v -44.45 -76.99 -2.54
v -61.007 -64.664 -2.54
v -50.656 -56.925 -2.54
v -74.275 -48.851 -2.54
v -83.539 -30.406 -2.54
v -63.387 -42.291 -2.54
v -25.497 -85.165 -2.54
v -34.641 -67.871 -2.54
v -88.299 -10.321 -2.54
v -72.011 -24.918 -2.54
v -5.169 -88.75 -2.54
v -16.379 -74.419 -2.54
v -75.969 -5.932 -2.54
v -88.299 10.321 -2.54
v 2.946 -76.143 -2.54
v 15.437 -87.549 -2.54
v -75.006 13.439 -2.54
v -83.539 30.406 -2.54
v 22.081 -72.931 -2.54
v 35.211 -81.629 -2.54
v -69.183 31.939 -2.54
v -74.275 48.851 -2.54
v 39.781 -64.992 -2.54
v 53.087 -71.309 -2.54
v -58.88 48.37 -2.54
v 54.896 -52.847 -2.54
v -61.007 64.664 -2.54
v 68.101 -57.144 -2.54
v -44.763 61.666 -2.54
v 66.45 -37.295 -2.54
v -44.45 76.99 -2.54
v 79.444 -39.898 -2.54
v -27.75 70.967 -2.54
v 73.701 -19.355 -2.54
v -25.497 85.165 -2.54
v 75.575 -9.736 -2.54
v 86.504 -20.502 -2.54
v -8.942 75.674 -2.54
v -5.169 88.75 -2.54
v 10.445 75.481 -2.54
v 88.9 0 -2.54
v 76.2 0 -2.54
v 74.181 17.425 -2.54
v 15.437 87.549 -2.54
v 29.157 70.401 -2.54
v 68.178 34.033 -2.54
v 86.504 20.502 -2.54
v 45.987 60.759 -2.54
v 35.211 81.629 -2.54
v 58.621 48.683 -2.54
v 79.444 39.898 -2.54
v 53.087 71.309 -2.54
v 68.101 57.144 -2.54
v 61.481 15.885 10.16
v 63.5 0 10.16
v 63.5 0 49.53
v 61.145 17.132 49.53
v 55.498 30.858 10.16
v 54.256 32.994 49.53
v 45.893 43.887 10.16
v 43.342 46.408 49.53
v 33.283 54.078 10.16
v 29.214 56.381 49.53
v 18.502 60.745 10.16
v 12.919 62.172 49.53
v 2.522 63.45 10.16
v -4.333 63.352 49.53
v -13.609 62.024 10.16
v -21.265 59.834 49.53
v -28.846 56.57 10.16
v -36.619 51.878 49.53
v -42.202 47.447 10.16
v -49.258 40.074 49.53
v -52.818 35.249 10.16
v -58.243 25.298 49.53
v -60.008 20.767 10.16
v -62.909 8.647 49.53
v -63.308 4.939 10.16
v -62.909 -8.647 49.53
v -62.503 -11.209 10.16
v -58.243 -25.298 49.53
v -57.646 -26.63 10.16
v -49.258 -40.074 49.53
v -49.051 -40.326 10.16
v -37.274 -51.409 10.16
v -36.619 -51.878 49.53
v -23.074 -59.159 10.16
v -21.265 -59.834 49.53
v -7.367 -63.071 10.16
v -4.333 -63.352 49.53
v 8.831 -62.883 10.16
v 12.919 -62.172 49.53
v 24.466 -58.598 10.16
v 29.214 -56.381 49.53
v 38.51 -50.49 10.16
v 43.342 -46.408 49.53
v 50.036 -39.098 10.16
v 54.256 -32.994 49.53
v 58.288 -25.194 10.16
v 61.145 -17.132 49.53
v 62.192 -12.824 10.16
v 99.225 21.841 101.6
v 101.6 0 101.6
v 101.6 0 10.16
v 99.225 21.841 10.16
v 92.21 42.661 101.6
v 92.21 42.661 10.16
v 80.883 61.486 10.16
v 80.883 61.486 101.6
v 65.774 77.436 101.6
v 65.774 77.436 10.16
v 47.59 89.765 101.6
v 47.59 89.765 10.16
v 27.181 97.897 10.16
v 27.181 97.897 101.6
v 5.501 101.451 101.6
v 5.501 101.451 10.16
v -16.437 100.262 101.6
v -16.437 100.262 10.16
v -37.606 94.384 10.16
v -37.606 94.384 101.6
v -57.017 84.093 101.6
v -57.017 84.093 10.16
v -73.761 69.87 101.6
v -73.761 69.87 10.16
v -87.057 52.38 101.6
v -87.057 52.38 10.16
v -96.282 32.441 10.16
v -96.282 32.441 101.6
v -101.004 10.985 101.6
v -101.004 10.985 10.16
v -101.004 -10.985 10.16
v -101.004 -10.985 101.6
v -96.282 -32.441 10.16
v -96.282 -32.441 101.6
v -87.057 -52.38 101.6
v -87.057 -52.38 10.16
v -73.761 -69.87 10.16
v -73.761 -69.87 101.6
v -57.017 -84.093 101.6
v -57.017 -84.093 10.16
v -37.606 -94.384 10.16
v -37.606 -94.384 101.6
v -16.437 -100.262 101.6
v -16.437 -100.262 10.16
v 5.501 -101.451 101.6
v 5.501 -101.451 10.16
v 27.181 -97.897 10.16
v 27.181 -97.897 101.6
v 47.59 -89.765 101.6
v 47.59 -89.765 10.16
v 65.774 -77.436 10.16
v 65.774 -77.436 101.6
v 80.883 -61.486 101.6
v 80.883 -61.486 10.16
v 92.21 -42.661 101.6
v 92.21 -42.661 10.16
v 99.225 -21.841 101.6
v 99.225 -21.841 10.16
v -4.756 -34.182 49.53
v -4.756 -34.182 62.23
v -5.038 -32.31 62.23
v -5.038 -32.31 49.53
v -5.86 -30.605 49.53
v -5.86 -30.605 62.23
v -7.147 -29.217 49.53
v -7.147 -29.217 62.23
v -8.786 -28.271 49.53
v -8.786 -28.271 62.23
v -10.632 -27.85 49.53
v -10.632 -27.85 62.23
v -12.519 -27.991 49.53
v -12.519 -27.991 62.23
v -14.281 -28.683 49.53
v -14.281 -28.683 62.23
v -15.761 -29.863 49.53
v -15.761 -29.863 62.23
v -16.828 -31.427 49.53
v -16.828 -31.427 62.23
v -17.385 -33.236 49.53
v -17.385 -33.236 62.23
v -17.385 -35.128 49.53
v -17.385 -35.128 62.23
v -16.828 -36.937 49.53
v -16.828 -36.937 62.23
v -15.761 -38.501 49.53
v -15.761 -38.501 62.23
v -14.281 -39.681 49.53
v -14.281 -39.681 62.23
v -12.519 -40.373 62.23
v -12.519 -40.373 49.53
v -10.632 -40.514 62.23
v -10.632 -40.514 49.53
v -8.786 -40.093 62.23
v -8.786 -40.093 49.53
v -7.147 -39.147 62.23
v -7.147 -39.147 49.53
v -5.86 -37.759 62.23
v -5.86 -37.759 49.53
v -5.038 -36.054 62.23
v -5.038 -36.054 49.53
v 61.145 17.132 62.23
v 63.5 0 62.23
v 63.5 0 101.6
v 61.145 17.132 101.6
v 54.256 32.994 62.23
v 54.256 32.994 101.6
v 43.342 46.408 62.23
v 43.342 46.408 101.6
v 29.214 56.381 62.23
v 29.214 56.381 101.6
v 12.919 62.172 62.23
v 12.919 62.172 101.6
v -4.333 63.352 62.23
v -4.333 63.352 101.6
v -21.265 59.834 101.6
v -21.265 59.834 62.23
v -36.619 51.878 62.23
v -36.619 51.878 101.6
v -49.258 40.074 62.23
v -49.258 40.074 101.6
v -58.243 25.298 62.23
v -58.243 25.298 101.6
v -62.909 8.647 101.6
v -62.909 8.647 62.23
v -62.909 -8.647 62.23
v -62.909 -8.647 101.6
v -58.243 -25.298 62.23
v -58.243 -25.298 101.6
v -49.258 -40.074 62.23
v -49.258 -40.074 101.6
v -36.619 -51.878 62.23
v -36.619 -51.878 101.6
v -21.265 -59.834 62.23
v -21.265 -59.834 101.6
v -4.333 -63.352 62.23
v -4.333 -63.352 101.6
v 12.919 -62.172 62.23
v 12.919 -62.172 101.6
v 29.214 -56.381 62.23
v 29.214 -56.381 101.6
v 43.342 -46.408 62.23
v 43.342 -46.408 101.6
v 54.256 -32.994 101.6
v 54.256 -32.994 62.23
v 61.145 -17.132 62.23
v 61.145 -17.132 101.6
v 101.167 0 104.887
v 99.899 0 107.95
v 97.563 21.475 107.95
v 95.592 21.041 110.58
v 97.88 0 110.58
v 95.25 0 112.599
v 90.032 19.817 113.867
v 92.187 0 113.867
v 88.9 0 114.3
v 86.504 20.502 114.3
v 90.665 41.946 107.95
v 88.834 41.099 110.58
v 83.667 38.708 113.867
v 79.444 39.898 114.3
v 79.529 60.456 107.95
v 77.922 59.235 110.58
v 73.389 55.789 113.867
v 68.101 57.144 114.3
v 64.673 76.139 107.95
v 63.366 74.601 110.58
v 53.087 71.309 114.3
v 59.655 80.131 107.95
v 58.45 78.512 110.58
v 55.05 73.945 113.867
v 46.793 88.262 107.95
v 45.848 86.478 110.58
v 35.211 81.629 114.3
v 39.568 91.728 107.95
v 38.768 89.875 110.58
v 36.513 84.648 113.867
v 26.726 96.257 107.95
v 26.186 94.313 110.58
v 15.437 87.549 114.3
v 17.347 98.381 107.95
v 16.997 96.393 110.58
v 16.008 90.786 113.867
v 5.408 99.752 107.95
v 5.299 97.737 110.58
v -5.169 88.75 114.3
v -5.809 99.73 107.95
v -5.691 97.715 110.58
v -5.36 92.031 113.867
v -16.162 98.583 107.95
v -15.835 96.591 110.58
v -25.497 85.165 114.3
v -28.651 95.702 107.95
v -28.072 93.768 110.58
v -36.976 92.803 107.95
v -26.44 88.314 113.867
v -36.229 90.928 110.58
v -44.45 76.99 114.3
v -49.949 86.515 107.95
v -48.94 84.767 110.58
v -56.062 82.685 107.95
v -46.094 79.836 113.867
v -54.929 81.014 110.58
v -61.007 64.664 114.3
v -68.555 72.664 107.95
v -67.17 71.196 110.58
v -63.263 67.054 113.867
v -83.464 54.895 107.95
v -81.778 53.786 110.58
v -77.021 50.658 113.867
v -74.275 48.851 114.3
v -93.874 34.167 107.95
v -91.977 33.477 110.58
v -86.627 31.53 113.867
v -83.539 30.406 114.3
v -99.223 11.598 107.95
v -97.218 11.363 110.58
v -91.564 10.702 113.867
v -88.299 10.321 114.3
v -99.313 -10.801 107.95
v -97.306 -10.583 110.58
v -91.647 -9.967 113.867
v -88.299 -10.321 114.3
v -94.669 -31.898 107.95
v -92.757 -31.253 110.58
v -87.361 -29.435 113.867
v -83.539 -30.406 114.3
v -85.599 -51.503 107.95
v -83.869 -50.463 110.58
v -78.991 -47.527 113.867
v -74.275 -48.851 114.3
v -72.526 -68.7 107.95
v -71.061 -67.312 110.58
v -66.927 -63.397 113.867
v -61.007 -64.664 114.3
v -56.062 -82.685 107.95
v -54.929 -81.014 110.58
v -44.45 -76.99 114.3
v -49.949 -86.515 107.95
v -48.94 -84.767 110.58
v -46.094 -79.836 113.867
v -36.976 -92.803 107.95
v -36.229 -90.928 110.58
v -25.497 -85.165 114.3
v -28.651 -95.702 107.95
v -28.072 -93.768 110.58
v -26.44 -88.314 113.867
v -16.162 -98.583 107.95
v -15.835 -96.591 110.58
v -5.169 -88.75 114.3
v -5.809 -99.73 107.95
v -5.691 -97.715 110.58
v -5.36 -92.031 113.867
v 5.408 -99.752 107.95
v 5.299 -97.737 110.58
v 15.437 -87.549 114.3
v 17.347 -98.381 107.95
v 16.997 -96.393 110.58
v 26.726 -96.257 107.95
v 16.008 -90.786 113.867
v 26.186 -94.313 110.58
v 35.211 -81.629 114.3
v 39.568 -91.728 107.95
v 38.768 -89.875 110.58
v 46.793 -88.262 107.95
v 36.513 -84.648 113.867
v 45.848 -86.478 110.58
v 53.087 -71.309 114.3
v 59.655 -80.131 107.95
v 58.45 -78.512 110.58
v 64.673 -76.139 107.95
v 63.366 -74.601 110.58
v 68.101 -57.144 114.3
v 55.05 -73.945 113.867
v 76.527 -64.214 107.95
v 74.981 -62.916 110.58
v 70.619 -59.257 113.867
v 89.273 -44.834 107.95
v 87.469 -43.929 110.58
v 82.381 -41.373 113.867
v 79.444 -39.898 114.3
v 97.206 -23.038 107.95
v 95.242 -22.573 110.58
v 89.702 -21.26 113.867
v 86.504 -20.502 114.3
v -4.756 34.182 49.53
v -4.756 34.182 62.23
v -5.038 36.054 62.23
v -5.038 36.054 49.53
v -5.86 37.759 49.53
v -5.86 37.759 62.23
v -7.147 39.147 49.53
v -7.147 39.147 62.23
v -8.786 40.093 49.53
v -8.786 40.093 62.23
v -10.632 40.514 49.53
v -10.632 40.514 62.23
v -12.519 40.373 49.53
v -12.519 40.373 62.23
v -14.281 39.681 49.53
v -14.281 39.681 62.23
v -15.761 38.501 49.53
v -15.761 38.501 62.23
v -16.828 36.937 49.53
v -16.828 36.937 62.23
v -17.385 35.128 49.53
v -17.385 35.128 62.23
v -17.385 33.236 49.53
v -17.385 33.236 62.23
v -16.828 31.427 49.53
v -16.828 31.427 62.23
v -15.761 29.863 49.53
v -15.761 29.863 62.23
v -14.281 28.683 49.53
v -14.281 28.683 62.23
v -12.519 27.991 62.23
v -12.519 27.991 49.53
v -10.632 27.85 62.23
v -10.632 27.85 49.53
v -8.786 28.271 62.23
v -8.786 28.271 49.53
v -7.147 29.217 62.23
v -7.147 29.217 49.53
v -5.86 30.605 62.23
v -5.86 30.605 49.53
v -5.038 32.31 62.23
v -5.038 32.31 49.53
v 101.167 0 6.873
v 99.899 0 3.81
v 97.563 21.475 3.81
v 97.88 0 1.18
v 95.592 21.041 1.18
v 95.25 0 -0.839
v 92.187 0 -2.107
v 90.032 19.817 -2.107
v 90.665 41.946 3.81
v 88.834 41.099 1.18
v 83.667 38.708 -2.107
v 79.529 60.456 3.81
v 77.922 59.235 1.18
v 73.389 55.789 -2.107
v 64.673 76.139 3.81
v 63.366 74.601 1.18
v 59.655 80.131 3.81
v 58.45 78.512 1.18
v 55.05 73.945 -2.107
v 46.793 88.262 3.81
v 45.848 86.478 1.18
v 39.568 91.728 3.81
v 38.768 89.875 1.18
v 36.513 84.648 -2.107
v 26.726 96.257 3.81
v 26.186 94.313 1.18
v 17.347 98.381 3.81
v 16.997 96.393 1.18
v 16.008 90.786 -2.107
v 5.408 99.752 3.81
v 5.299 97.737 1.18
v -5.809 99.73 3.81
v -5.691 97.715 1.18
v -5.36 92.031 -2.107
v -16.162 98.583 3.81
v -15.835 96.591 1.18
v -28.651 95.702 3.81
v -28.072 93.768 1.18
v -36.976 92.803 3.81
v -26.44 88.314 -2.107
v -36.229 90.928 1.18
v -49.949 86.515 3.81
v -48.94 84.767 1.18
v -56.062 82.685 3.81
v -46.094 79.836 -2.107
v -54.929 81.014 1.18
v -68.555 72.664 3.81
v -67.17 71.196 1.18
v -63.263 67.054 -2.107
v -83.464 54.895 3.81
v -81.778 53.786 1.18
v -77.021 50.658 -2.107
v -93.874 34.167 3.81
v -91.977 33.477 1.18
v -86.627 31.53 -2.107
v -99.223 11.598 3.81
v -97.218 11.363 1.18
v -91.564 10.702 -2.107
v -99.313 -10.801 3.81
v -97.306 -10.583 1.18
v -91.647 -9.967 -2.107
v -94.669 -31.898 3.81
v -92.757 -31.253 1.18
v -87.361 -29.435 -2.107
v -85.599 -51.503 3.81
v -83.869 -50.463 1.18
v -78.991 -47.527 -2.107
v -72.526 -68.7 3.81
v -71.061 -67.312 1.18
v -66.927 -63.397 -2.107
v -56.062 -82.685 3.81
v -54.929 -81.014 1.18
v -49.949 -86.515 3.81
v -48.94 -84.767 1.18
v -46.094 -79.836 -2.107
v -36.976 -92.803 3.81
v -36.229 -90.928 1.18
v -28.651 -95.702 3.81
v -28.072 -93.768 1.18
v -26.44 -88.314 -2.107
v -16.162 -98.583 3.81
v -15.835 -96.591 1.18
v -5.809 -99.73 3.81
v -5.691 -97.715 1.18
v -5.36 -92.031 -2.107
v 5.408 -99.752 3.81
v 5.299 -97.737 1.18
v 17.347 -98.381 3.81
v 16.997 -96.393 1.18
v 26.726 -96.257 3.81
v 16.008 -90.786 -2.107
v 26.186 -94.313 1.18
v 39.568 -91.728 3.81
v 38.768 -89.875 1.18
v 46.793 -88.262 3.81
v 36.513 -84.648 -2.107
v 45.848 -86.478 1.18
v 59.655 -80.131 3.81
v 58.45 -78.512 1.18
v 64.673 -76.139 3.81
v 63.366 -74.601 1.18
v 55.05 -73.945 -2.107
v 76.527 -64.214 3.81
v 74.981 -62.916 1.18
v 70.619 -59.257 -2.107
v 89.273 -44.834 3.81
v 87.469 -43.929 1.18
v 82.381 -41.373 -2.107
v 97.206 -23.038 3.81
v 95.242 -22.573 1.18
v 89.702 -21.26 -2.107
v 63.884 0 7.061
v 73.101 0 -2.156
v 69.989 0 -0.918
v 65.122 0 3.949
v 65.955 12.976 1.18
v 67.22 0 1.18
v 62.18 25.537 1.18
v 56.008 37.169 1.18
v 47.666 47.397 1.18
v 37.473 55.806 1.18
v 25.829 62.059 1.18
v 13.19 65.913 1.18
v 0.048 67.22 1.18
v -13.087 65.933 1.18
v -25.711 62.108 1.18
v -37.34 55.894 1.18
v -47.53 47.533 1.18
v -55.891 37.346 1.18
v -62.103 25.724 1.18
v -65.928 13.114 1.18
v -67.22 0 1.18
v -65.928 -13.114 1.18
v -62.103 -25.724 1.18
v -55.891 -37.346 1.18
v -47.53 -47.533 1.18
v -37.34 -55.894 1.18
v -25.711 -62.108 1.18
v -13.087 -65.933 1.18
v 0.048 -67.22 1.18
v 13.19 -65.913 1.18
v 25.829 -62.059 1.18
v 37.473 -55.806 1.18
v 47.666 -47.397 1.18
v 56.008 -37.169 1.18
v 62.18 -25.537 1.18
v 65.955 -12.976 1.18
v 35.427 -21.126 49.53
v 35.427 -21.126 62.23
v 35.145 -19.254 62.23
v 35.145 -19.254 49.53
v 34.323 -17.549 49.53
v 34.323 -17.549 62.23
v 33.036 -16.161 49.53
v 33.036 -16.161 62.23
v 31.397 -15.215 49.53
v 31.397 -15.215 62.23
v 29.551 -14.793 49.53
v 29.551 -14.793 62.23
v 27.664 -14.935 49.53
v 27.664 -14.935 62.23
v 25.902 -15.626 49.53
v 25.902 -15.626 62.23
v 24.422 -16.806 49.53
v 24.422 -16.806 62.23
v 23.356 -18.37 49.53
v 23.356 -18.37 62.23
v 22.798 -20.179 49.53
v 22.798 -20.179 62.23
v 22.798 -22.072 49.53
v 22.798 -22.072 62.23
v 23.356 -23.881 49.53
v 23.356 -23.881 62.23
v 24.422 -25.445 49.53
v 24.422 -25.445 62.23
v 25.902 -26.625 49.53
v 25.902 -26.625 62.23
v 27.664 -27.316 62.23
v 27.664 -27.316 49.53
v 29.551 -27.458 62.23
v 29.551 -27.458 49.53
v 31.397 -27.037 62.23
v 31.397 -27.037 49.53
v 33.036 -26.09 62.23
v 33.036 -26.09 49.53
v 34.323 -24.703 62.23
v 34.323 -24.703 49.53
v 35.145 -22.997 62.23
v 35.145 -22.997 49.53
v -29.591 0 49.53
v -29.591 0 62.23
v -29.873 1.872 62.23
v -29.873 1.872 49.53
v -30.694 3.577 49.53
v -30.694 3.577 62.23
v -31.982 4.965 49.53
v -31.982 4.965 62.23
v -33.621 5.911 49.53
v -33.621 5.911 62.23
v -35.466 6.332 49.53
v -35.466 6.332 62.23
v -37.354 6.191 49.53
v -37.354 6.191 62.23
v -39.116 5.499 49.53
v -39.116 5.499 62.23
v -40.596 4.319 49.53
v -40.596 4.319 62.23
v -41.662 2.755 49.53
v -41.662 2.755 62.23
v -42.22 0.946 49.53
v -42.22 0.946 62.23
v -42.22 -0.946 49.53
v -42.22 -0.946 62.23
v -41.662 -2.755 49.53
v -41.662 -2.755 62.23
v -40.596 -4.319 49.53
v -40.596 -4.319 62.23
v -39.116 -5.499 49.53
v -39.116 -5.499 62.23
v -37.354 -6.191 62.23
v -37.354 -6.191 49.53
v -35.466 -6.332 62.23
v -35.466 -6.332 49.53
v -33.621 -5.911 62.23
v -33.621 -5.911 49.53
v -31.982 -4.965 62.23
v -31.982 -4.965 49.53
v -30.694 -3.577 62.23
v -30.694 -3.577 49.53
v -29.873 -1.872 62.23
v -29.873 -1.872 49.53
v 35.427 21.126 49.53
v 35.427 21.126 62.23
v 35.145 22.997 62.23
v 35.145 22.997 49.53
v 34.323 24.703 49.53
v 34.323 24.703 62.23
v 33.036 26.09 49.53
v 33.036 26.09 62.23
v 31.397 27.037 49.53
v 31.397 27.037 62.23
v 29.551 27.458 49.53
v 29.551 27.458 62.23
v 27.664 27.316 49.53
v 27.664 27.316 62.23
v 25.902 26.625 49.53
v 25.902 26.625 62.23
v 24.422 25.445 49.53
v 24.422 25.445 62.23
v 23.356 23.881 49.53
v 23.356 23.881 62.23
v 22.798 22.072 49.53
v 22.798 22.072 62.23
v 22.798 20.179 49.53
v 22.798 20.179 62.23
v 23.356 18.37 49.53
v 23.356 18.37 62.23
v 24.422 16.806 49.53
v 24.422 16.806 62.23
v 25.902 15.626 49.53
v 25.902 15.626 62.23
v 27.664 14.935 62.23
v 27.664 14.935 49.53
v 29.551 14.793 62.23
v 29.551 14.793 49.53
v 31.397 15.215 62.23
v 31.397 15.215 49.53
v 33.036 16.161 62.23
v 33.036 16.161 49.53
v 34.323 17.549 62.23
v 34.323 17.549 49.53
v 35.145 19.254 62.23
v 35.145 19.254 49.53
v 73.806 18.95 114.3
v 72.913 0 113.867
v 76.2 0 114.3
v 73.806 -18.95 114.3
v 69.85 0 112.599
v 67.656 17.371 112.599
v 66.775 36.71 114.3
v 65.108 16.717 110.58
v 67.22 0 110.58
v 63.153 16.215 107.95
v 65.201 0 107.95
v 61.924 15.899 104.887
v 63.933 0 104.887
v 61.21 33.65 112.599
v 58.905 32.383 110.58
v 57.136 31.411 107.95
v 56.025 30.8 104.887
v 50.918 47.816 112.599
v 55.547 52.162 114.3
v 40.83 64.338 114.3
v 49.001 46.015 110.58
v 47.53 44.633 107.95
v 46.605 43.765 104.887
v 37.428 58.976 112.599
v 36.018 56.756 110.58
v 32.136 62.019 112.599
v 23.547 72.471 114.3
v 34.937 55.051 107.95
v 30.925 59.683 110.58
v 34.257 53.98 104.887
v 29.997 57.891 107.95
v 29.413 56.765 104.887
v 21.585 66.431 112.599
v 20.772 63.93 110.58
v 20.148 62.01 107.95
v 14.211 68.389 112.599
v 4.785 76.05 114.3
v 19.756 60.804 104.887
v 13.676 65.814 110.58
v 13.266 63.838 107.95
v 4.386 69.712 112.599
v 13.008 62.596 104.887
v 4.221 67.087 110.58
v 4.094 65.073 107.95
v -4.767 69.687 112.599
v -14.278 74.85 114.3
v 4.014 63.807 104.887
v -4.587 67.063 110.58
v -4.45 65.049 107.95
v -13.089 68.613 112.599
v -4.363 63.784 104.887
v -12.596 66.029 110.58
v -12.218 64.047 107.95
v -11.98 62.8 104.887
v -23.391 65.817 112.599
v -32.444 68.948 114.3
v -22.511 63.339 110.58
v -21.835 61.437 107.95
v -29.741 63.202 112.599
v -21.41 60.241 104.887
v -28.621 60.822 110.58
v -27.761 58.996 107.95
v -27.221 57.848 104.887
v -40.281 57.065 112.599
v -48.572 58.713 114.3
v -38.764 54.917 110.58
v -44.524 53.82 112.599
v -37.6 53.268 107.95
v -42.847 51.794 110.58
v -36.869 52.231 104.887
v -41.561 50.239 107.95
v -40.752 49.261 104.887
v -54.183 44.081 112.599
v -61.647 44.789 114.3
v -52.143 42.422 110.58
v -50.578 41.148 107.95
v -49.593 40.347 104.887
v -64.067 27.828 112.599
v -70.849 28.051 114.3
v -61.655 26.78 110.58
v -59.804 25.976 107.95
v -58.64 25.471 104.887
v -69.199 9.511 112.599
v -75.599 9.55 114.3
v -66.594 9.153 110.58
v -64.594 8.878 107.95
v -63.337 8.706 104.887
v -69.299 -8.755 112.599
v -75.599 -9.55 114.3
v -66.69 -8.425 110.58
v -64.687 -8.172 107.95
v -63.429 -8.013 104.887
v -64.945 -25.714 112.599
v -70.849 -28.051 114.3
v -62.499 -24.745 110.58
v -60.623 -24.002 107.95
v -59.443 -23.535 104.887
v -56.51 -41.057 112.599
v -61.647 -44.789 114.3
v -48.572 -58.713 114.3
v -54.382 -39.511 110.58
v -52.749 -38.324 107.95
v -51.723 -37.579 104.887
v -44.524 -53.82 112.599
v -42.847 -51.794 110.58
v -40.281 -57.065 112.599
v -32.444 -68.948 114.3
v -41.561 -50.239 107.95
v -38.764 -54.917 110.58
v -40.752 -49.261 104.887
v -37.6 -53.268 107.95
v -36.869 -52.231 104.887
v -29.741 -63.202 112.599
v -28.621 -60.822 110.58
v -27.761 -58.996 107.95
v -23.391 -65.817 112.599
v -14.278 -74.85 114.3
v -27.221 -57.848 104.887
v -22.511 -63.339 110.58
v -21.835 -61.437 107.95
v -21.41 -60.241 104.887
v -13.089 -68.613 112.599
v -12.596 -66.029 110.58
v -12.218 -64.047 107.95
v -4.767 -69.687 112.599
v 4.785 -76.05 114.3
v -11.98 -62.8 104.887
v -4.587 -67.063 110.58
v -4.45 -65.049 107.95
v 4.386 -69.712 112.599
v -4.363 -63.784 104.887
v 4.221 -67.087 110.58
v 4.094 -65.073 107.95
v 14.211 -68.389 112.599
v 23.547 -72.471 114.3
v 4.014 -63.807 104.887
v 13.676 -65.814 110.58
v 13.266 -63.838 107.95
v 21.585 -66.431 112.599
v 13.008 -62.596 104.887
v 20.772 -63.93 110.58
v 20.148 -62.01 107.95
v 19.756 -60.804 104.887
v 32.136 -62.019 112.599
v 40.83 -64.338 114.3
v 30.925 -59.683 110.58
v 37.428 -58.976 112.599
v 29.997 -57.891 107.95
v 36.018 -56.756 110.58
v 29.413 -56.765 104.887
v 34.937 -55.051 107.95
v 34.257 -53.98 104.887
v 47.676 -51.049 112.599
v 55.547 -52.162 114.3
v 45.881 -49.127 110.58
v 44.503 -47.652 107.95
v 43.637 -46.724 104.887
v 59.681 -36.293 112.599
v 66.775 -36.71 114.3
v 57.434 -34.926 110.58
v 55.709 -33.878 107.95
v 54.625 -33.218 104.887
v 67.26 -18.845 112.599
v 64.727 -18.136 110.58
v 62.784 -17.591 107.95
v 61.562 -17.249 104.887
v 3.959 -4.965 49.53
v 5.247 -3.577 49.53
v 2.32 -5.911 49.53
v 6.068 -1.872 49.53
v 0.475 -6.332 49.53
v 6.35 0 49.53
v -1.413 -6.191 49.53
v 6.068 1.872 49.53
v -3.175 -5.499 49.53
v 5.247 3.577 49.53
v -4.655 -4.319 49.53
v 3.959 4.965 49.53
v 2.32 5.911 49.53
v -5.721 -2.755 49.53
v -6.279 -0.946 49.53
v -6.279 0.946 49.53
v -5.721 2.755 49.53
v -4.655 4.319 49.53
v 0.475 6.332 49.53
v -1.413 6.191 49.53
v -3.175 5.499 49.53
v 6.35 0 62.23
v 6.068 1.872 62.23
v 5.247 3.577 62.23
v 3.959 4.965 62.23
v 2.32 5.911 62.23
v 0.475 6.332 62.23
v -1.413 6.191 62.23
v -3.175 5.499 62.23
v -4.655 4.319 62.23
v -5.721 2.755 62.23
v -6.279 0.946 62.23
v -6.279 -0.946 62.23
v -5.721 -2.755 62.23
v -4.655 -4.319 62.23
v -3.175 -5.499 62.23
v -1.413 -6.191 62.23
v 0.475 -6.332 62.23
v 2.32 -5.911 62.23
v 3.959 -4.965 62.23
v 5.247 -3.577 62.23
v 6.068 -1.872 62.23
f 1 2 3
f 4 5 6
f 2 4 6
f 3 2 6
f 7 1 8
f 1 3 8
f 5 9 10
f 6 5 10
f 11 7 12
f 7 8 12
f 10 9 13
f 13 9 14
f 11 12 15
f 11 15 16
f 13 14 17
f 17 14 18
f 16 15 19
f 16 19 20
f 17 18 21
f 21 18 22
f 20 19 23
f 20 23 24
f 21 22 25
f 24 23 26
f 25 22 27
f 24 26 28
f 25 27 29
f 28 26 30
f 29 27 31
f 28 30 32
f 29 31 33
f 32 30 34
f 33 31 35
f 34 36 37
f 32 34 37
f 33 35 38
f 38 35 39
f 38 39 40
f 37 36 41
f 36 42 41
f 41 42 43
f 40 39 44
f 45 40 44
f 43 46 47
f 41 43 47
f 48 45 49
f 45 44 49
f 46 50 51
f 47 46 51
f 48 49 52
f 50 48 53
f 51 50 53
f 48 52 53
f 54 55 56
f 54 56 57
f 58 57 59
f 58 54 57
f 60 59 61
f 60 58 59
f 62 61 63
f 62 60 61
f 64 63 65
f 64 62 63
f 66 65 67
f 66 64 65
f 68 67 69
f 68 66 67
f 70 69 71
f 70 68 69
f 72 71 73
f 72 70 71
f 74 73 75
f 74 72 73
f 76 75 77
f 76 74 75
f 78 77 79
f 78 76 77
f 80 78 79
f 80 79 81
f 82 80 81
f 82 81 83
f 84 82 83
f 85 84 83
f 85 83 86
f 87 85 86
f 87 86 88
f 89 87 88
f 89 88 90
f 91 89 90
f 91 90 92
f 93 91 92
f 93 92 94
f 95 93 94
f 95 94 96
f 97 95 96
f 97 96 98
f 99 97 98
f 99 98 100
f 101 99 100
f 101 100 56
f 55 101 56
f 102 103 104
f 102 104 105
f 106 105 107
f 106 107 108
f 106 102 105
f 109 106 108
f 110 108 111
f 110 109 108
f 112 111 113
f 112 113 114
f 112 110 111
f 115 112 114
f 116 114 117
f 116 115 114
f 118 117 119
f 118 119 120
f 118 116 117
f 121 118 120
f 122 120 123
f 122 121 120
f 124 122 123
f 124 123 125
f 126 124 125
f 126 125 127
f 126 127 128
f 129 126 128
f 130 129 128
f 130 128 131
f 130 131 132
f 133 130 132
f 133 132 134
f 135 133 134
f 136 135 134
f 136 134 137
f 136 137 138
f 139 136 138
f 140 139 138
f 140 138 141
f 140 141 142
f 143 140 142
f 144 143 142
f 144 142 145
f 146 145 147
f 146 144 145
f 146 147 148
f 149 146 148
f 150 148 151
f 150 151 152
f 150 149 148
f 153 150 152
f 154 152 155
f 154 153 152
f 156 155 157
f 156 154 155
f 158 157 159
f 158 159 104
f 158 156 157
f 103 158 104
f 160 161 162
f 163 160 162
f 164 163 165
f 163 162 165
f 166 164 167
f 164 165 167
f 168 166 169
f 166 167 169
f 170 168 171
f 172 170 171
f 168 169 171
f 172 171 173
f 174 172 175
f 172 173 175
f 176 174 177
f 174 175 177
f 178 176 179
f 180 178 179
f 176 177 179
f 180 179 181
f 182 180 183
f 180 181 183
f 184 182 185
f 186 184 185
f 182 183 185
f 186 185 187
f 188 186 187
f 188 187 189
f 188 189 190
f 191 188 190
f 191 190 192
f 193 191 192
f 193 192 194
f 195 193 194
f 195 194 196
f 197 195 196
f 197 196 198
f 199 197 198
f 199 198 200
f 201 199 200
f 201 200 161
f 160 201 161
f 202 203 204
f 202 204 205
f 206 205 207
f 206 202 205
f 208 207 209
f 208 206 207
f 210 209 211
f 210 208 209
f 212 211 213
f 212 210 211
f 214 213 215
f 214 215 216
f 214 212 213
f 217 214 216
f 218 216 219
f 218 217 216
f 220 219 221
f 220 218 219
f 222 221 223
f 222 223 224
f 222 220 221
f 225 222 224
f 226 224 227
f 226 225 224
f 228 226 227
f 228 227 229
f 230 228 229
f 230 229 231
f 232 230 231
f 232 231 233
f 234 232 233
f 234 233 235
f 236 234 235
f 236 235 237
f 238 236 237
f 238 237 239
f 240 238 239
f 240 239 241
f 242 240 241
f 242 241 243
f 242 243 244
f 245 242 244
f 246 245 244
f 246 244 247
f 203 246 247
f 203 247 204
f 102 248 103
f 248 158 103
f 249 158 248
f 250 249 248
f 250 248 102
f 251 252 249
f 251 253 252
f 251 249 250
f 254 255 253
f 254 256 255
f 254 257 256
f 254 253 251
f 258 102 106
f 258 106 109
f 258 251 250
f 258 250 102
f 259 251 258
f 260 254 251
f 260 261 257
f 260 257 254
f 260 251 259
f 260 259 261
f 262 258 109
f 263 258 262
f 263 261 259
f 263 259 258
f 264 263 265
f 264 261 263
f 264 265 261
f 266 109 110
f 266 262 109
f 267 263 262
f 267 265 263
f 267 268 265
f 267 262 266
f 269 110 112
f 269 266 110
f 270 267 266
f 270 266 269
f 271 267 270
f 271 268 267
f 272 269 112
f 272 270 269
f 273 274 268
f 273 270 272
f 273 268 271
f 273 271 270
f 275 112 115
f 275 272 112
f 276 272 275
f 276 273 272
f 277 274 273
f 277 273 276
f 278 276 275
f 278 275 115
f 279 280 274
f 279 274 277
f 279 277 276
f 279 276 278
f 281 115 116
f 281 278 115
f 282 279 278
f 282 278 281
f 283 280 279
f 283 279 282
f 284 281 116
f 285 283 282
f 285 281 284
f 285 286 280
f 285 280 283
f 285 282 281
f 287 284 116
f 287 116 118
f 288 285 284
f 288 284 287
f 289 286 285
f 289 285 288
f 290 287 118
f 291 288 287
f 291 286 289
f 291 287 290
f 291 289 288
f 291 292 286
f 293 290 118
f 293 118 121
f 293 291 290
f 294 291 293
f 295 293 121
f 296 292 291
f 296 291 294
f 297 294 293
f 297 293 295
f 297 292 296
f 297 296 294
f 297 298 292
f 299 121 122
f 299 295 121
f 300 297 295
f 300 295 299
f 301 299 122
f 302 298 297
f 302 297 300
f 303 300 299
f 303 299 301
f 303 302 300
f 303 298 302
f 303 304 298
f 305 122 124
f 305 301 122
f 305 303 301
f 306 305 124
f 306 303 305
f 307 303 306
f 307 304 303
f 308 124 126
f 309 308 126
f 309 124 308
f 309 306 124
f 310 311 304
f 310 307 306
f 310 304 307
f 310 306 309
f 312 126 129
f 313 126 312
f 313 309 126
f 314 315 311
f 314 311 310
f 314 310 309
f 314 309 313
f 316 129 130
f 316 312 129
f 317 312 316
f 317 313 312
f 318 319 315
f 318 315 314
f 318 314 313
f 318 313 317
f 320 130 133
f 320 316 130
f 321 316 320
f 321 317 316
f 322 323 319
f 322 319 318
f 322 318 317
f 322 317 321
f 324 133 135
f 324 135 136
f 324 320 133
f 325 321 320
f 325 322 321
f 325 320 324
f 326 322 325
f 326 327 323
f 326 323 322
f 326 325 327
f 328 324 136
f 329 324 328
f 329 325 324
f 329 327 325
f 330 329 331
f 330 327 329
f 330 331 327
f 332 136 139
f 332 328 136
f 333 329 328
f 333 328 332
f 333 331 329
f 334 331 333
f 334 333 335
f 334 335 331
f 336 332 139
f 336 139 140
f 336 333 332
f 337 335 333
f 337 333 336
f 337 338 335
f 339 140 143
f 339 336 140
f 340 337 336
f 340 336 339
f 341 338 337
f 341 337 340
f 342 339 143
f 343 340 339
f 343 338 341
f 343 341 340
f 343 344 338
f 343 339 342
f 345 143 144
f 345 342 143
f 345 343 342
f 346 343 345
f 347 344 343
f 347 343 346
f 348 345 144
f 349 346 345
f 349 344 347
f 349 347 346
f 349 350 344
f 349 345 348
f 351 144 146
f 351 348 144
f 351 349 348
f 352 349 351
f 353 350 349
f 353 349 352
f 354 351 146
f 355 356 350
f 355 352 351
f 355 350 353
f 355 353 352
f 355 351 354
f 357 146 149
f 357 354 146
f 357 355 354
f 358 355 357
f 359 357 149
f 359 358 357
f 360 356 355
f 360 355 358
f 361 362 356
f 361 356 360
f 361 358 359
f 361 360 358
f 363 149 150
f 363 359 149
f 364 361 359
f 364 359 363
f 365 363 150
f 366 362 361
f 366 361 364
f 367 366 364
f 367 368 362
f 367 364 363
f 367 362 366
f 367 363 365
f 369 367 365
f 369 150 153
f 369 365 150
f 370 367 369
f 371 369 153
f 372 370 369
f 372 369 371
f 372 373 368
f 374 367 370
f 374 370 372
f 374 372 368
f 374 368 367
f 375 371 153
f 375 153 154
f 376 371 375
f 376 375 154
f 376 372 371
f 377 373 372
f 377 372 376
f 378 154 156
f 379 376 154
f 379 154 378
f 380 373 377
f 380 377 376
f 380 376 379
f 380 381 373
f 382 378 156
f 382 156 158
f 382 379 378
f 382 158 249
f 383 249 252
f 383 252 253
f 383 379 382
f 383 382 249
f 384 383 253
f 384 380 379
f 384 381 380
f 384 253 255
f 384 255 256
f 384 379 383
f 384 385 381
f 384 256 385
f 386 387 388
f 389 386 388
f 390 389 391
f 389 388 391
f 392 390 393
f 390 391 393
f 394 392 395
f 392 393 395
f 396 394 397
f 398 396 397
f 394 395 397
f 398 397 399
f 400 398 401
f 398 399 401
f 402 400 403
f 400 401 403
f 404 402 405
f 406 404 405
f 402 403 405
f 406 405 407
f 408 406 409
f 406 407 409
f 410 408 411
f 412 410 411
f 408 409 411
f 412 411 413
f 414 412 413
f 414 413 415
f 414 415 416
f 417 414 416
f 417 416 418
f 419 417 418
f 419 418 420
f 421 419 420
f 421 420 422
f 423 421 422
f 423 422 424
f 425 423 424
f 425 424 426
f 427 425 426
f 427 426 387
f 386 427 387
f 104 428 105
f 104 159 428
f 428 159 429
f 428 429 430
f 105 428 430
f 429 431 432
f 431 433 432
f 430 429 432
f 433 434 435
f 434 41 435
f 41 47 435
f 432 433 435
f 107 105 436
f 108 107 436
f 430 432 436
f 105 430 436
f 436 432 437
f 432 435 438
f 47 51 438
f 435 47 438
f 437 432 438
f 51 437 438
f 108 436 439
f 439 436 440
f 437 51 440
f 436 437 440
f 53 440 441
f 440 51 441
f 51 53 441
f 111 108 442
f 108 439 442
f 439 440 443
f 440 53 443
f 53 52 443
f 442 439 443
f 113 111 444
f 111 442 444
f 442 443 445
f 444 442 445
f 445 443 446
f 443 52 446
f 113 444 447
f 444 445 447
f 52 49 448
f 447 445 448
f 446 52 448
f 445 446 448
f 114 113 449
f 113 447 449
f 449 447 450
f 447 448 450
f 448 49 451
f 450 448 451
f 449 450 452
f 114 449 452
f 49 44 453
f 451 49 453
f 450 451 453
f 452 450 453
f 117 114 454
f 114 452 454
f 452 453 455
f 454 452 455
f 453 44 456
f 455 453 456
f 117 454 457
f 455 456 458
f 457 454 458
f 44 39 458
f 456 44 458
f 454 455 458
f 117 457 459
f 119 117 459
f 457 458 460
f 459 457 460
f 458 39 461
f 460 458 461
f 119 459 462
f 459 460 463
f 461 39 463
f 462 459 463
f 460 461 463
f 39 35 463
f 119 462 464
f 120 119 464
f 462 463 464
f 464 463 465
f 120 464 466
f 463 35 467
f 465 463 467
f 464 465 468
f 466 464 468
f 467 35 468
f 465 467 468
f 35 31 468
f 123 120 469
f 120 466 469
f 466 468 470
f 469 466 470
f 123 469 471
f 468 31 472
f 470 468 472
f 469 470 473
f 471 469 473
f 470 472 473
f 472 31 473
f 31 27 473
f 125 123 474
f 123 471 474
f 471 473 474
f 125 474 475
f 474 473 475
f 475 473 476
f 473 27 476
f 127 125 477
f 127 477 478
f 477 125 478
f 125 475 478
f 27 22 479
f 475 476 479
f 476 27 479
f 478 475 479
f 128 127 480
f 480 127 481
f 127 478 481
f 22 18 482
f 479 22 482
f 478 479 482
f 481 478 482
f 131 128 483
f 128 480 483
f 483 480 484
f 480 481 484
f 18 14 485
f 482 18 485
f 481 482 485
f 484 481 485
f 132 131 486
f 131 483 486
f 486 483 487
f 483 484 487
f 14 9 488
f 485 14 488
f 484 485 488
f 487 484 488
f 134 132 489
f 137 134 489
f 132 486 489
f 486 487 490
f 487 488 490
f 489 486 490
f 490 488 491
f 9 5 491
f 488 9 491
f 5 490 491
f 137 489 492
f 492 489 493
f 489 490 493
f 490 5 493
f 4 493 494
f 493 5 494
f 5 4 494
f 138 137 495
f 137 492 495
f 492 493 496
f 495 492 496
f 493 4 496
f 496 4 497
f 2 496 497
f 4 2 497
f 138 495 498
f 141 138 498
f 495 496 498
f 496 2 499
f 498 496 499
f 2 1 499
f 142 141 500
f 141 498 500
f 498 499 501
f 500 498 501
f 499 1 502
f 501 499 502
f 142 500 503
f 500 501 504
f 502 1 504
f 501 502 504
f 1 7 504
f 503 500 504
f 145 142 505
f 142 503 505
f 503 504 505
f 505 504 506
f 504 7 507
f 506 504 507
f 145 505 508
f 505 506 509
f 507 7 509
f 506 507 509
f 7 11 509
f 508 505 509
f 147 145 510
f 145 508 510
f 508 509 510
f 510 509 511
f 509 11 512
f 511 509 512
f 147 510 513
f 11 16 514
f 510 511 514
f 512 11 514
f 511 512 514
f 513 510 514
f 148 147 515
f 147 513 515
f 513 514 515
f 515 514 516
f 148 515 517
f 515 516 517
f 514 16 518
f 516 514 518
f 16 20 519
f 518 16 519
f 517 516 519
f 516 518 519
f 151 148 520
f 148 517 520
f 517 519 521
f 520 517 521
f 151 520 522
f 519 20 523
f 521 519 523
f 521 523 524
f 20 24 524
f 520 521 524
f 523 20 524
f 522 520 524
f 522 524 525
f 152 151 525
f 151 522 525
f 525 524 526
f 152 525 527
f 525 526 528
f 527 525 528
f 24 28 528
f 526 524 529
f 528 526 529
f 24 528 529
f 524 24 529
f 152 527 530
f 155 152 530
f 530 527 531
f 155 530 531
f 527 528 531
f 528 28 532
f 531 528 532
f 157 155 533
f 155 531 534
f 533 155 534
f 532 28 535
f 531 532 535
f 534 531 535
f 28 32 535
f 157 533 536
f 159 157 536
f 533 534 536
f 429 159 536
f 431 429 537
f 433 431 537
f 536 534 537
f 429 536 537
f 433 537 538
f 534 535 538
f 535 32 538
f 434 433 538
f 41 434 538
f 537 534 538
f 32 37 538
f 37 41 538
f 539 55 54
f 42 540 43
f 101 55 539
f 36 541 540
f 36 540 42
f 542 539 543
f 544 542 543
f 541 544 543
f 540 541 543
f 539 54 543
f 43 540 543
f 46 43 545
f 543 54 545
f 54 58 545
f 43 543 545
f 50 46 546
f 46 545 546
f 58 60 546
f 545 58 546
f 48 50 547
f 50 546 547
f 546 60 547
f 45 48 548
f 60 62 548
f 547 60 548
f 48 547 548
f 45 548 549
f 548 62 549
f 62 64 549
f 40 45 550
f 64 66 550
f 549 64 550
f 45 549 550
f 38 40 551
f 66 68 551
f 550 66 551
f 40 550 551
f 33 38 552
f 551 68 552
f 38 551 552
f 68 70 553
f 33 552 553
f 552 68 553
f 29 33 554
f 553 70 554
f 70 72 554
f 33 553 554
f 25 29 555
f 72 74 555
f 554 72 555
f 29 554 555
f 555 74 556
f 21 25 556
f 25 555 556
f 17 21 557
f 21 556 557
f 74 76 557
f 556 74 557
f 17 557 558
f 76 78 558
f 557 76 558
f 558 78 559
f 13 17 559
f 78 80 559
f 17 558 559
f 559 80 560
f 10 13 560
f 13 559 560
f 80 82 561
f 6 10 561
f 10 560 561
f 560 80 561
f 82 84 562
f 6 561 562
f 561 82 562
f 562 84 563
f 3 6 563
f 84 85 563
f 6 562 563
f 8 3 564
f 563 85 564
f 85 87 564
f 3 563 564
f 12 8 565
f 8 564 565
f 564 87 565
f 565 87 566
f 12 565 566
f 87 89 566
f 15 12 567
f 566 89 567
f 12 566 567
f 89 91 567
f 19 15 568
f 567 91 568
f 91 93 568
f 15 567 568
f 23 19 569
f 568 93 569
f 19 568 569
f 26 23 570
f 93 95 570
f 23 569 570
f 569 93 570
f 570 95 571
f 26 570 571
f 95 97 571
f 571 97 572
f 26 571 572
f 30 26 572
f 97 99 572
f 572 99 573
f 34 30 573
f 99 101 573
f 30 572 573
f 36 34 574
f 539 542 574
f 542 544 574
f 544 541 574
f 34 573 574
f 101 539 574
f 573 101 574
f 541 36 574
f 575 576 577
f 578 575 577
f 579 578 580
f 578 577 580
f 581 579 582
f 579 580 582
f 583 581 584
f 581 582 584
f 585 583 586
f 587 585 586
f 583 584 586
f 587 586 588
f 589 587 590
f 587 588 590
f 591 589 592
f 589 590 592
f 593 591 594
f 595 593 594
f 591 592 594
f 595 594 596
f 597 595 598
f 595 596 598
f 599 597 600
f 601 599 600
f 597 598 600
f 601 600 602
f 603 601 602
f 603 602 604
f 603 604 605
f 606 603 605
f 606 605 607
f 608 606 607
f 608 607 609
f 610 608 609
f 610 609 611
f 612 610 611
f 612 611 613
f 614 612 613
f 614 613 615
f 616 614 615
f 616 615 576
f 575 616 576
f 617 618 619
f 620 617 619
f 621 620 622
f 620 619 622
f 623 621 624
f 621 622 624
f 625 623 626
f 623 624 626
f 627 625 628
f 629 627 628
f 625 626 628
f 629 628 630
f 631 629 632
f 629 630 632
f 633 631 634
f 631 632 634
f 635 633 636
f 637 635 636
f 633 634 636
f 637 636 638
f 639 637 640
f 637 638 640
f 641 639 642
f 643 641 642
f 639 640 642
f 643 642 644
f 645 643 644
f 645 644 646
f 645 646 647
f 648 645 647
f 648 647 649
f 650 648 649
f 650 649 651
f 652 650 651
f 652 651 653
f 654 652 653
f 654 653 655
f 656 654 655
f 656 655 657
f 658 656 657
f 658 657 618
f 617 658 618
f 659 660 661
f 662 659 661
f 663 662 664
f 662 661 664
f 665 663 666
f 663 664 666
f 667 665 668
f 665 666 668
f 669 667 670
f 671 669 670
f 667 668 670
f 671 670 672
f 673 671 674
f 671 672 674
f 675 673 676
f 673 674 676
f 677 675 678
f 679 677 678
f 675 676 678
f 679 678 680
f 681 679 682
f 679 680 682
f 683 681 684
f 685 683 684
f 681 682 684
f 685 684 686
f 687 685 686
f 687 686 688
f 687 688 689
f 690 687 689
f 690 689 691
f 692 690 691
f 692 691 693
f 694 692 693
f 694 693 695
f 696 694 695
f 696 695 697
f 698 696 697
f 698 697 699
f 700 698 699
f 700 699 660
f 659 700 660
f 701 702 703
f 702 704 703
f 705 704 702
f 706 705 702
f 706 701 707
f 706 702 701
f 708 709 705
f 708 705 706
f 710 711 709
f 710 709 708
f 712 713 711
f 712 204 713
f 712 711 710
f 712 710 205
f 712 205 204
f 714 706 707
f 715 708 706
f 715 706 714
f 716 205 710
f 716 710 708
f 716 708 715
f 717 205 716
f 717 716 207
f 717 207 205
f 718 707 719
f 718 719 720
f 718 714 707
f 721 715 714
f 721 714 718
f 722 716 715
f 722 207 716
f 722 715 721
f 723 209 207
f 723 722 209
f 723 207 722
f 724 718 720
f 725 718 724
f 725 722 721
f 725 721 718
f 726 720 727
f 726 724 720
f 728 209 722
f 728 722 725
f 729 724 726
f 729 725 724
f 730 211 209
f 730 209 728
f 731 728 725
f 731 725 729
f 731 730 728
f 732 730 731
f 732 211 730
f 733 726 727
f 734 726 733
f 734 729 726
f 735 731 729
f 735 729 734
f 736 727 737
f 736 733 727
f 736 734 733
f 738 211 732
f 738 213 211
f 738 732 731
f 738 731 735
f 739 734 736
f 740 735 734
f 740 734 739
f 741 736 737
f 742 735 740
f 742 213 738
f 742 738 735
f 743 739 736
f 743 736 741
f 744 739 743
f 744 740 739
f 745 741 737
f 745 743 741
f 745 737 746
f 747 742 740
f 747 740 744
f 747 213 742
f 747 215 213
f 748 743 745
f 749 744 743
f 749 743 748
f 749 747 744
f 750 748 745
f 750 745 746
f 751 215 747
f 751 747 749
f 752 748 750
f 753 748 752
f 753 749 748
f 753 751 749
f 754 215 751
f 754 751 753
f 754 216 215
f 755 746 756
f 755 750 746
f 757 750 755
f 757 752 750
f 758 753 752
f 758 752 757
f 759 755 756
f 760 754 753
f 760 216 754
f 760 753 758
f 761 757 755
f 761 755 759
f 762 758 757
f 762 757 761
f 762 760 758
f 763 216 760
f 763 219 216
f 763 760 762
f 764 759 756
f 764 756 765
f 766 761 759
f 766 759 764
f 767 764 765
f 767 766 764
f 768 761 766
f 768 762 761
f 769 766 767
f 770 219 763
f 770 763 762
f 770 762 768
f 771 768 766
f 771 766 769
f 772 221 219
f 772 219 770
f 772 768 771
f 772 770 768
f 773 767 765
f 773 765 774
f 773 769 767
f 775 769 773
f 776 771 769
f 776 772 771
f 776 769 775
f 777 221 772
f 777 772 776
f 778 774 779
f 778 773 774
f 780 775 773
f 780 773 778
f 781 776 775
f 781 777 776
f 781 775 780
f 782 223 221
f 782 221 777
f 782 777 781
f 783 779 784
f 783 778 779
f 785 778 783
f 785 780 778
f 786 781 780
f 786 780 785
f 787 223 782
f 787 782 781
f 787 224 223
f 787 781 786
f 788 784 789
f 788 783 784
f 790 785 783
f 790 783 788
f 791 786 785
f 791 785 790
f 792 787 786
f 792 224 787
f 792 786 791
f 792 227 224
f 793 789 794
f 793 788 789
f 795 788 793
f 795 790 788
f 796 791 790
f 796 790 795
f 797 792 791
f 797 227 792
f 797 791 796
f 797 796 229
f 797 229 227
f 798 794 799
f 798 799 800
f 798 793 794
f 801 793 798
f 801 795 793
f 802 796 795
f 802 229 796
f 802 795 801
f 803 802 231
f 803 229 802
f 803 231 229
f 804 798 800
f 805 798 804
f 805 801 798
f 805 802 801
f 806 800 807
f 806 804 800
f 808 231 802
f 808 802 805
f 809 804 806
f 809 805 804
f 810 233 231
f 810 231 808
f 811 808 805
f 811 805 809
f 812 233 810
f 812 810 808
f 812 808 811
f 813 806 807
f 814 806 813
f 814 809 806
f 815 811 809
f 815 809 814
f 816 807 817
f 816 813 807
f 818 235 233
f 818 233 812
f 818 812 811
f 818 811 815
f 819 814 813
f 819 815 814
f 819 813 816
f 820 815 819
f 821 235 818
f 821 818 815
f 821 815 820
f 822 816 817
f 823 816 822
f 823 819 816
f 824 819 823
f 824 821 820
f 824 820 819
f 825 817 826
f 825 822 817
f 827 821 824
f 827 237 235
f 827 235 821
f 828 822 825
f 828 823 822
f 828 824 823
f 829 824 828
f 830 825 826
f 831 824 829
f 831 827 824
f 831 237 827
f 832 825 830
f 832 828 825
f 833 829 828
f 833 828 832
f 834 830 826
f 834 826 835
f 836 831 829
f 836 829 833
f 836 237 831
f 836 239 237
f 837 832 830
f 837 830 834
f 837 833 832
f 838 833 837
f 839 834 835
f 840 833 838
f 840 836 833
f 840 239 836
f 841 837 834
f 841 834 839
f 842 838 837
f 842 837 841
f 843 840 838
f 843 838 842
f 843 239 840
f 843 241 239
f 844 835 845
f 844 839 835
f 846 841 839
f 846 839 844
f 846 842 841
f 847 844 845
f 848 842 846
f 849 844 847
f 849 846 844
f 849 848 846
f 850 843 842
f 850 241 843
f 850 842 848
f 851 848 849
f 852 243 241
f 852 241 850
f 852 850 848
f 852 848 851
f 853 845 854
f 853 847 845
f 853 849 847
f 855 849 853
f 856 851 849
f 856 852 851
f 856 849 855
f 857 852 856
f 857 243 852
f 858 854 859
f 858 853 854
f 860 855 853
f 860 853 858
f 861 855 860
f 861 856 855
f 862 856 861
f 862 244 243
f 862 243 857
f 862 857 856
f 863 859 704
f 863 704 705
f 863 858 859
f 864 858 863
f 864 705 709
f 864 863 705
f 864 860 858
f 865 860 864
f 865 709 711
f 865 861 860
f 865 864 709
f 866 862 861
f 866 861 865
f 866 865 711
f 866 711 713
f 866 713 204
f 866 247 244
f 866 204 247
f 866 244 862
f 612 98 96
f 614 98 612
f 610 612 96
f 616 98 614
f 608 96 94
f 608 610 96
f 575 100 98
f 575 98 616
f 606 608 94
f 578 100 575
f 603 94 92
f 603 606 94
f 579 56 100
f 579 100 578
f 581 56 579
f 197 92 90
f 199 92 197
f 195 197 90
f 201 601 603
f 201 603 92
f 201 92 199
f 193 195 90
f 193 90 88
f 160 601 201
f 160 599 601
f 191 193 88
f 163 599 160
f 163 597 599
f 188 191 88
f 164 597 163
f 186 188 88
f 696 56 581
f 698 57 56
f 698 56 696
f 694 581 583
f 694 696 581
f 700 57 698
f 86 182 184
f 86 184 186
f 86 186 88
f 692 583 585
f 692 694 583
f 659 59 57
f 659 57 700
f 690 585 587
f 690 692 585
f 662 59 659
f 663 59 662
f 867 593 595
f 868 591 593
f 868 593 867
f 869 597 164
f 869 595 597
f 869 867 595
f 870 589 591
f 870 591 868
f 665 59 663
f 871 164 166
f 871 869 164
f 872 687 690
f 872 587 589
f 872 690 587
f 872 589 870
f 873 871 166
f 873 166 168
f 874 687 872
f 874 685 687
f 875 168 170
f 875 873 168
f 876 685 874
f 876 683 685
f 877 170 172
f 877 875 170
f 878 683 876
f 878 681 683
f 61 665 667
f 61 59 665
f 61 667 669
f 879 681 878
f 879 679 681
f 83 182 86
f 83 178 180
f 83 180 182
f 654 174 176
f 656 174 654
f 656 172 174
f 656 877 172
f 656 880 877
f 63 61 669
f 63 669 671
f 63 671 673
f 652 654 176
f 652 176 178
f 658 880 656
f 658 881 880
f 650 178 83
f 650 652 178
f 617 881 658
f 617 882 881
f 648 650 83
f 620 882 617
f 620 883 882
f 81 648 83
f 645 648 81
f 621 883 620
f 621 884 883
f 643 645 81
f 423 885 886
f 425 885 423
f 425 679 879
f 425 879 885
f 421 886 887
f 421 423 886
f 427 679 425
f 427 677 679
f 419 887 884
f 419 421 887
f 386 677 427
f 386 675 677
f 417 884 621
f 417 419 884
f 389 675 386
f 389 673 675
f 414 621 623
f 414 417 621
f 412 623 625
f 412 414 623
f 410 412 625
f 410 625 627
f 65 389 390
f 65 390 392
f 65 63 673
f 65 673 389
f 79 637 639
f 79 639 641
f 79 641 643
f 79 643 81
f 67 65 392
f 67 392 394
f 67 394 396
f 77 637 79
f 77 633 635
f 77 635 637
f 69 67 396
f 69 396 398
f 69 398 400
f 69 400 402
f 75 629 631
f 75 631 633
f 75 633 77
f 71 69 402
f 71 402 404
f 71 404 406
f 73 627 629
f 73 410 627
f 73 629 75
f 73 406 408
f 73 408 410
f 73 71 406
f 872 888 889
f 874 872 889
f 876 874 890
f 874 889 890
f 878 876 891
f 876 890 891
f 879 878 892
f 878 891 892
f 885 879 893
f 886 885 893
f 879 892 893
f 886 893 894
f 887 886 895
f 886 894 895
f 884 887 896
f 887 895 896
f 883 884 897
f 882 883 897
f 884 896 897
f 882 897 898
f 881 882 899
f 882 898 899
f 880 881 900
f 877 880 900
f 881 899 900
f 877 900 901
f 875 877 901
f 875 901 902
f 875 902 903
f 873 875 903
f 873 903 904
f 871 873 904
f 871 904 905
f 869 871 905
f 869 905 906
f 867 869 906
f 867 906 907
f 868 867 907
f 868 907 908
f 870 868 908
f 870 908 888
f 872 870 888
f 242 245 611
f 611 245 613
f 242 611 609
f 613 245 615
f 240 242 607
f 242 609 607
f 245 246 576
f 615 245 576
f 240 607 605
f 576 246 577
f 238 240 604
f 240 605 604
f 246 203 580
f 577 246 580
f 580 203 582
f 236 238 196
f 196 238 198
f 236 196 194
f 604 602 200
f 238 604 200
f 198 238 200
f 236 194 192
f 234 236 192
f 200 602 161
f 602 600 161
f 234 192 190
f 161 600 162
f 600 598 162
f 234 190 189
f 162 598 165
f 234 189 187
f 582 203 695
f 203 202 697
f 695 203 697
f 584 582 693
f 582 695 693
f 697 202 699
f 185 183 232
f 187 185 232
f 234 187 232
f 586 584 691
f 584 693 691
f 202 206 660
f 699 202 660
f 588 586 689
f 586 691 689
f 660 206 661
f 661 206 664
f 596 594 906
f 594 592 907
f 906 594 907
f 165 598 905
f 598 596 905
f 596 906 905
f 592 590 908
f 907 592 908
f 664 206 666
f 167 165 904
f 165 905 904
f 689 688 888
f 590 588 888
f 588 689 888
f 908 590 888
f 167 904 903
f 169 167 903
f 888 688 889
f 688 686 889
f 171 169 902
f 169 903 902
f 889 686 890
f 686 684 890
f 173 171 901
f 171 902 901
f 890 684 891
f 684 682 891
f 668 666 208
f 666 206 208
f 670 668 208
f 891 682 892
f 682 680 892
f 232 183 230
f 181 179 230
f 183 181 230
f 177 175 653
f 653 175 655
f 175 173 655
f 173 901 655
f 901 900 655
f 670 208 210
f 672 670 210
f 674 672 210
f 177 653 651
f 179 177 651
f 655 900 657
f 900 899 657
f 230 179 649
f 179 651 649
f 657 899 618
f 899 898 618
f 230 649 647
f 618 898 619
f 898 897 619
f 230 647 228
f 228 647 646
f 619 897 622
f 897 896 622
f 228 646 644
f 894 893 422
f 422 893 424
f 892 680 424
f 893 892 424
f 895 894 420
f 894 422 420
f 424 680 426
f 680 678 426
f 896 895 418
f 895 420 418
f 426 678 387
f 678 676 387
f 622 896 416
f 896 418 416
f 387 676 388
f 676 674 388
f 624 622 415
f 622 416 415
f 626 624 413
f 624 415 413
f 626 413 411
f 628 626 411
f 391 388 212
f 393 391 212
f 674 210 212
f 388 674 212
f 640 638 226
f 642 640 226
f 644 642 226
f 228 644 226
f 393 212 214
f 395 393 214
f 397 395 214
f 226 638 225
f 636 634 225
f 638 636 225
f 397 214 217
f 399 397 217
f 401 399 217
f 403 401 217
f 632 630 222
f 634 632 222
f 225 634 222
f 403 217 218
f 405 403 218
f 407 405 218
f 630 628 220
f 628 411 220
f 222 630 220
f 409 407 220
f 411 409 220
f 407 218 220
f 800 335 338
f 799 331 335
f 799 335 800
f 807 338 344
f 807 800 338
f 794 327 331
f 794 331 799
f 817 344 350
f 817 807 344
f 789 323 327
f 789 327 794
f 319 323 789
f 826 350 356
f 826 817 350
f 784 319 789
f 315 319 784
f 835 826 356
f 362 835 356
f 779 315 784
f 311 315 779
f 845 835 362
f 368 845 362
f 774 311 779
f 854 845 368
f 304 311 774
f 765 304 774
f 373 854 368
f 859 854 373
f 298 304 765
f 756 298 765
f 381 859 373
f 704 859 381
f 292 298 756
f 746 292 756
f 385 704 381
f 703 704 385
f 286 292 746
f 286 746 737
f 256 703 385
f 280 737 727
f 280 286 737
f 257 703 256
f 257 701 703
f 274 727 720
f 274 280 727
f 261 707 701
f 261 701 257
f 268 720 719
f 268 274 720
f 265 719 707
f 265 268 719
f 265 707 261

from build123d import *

# Parameters (mm, degrees)
SKETCH2_R                = 101.6
SKETCH2_R_2              = 63.5
BOSS_EXTRUDE1_DEPTH      = 114.3
BOSS_EXTRUDE1_DEPTH_BACK = 2.54
FILLET1_R                = 12.7
SKETCH4_R                = 63.5
BOSS_EXTRUDE2_DEPTH      = 6.35
BOSS_EXTRUDE2_DEPTH_BACK = 6.35
SKETCH13_R               = 6.35
CUT_EXTRUDE1_DEPTH       = 50.53
CUT_EXTRUDE1_DEPTH_BACK  = 68.3100001


with BuildPart() as part:
    # Sketch2 → Boss-Extrude1 (new body, two sides)
    with BuildSketch(Plane.XY) as boss_extrude1_sk:
        Circle(SKETCH2_R)
        Circle(SKETCH2_R_2, mode=Mode.SUBTRACT)
    extrude(amount=BOSS_EXTRUDE1_DEPTH)
    extrude(boss_extrude1_sk.sketch, amount=-BOSS_EXTRUDE1_DEPTH_BACK)

    # Fillet1
    fillet1_edges = [part.edges().sort_by_distance(p)[0] for p in [
        (-101.6, 0, -2.54),
        (-63.5, 0, -2.54),
        (-101.6, 0, 114.3),
        (-63.5, 0, 114.3),
    ]]
    fillet(fillet1_edges, radius=FILLET1_R)

    # Sketch4 → Boss-Extrude2 (add, two sides)
    with BuildSketch(Plane(origin=(0, 0, 55.88), x_dir=(-1, 0, 0), z_dir=(0, 0, -1))) as boss_extrude2_sk:
        Circle(SKETCH4_R)
    extrude(amount=BOSS_EXTRUDE2_DEPTH)
    extrude(boss_extrude2_sk.sketch, amount=-BOSS_EXTRUDE2_DEPTH_BACK)

    # Sketch13 → Cut-Extrude1 (cut, two sides)
    with BuildSketch(Plane.XY.offset(64.77)) as cut_extrude1_sk:
        Circle(SKETCH13_R)
        with Locations((-35.941, 0)):
            Circle(SKETCH13_R)
        with Locations((-11.106379795, 34.181922252)):
            Circle(SKETCH13_R)
        with Locations((29.076879795, 21.125589753)):
            Circle(SKETCH13_R)
        with Locations((29.076879795, -21.125589753)):
            Circle(SKETCH13_R)
        with Locations((-11.106379795, -34.181922252)):
            Circle(SKETCH13_R)
    extrude(amount=CUT_EXTRUDE1_DEPTH, mode=Mode.SUBTRACT)
    extrude(cut_extrude1_sk.sketch, amount=-CUT_EXTRUDE1_DEPTH_BACK, mode=Mode.SUBTRACT)


solid = part.part
